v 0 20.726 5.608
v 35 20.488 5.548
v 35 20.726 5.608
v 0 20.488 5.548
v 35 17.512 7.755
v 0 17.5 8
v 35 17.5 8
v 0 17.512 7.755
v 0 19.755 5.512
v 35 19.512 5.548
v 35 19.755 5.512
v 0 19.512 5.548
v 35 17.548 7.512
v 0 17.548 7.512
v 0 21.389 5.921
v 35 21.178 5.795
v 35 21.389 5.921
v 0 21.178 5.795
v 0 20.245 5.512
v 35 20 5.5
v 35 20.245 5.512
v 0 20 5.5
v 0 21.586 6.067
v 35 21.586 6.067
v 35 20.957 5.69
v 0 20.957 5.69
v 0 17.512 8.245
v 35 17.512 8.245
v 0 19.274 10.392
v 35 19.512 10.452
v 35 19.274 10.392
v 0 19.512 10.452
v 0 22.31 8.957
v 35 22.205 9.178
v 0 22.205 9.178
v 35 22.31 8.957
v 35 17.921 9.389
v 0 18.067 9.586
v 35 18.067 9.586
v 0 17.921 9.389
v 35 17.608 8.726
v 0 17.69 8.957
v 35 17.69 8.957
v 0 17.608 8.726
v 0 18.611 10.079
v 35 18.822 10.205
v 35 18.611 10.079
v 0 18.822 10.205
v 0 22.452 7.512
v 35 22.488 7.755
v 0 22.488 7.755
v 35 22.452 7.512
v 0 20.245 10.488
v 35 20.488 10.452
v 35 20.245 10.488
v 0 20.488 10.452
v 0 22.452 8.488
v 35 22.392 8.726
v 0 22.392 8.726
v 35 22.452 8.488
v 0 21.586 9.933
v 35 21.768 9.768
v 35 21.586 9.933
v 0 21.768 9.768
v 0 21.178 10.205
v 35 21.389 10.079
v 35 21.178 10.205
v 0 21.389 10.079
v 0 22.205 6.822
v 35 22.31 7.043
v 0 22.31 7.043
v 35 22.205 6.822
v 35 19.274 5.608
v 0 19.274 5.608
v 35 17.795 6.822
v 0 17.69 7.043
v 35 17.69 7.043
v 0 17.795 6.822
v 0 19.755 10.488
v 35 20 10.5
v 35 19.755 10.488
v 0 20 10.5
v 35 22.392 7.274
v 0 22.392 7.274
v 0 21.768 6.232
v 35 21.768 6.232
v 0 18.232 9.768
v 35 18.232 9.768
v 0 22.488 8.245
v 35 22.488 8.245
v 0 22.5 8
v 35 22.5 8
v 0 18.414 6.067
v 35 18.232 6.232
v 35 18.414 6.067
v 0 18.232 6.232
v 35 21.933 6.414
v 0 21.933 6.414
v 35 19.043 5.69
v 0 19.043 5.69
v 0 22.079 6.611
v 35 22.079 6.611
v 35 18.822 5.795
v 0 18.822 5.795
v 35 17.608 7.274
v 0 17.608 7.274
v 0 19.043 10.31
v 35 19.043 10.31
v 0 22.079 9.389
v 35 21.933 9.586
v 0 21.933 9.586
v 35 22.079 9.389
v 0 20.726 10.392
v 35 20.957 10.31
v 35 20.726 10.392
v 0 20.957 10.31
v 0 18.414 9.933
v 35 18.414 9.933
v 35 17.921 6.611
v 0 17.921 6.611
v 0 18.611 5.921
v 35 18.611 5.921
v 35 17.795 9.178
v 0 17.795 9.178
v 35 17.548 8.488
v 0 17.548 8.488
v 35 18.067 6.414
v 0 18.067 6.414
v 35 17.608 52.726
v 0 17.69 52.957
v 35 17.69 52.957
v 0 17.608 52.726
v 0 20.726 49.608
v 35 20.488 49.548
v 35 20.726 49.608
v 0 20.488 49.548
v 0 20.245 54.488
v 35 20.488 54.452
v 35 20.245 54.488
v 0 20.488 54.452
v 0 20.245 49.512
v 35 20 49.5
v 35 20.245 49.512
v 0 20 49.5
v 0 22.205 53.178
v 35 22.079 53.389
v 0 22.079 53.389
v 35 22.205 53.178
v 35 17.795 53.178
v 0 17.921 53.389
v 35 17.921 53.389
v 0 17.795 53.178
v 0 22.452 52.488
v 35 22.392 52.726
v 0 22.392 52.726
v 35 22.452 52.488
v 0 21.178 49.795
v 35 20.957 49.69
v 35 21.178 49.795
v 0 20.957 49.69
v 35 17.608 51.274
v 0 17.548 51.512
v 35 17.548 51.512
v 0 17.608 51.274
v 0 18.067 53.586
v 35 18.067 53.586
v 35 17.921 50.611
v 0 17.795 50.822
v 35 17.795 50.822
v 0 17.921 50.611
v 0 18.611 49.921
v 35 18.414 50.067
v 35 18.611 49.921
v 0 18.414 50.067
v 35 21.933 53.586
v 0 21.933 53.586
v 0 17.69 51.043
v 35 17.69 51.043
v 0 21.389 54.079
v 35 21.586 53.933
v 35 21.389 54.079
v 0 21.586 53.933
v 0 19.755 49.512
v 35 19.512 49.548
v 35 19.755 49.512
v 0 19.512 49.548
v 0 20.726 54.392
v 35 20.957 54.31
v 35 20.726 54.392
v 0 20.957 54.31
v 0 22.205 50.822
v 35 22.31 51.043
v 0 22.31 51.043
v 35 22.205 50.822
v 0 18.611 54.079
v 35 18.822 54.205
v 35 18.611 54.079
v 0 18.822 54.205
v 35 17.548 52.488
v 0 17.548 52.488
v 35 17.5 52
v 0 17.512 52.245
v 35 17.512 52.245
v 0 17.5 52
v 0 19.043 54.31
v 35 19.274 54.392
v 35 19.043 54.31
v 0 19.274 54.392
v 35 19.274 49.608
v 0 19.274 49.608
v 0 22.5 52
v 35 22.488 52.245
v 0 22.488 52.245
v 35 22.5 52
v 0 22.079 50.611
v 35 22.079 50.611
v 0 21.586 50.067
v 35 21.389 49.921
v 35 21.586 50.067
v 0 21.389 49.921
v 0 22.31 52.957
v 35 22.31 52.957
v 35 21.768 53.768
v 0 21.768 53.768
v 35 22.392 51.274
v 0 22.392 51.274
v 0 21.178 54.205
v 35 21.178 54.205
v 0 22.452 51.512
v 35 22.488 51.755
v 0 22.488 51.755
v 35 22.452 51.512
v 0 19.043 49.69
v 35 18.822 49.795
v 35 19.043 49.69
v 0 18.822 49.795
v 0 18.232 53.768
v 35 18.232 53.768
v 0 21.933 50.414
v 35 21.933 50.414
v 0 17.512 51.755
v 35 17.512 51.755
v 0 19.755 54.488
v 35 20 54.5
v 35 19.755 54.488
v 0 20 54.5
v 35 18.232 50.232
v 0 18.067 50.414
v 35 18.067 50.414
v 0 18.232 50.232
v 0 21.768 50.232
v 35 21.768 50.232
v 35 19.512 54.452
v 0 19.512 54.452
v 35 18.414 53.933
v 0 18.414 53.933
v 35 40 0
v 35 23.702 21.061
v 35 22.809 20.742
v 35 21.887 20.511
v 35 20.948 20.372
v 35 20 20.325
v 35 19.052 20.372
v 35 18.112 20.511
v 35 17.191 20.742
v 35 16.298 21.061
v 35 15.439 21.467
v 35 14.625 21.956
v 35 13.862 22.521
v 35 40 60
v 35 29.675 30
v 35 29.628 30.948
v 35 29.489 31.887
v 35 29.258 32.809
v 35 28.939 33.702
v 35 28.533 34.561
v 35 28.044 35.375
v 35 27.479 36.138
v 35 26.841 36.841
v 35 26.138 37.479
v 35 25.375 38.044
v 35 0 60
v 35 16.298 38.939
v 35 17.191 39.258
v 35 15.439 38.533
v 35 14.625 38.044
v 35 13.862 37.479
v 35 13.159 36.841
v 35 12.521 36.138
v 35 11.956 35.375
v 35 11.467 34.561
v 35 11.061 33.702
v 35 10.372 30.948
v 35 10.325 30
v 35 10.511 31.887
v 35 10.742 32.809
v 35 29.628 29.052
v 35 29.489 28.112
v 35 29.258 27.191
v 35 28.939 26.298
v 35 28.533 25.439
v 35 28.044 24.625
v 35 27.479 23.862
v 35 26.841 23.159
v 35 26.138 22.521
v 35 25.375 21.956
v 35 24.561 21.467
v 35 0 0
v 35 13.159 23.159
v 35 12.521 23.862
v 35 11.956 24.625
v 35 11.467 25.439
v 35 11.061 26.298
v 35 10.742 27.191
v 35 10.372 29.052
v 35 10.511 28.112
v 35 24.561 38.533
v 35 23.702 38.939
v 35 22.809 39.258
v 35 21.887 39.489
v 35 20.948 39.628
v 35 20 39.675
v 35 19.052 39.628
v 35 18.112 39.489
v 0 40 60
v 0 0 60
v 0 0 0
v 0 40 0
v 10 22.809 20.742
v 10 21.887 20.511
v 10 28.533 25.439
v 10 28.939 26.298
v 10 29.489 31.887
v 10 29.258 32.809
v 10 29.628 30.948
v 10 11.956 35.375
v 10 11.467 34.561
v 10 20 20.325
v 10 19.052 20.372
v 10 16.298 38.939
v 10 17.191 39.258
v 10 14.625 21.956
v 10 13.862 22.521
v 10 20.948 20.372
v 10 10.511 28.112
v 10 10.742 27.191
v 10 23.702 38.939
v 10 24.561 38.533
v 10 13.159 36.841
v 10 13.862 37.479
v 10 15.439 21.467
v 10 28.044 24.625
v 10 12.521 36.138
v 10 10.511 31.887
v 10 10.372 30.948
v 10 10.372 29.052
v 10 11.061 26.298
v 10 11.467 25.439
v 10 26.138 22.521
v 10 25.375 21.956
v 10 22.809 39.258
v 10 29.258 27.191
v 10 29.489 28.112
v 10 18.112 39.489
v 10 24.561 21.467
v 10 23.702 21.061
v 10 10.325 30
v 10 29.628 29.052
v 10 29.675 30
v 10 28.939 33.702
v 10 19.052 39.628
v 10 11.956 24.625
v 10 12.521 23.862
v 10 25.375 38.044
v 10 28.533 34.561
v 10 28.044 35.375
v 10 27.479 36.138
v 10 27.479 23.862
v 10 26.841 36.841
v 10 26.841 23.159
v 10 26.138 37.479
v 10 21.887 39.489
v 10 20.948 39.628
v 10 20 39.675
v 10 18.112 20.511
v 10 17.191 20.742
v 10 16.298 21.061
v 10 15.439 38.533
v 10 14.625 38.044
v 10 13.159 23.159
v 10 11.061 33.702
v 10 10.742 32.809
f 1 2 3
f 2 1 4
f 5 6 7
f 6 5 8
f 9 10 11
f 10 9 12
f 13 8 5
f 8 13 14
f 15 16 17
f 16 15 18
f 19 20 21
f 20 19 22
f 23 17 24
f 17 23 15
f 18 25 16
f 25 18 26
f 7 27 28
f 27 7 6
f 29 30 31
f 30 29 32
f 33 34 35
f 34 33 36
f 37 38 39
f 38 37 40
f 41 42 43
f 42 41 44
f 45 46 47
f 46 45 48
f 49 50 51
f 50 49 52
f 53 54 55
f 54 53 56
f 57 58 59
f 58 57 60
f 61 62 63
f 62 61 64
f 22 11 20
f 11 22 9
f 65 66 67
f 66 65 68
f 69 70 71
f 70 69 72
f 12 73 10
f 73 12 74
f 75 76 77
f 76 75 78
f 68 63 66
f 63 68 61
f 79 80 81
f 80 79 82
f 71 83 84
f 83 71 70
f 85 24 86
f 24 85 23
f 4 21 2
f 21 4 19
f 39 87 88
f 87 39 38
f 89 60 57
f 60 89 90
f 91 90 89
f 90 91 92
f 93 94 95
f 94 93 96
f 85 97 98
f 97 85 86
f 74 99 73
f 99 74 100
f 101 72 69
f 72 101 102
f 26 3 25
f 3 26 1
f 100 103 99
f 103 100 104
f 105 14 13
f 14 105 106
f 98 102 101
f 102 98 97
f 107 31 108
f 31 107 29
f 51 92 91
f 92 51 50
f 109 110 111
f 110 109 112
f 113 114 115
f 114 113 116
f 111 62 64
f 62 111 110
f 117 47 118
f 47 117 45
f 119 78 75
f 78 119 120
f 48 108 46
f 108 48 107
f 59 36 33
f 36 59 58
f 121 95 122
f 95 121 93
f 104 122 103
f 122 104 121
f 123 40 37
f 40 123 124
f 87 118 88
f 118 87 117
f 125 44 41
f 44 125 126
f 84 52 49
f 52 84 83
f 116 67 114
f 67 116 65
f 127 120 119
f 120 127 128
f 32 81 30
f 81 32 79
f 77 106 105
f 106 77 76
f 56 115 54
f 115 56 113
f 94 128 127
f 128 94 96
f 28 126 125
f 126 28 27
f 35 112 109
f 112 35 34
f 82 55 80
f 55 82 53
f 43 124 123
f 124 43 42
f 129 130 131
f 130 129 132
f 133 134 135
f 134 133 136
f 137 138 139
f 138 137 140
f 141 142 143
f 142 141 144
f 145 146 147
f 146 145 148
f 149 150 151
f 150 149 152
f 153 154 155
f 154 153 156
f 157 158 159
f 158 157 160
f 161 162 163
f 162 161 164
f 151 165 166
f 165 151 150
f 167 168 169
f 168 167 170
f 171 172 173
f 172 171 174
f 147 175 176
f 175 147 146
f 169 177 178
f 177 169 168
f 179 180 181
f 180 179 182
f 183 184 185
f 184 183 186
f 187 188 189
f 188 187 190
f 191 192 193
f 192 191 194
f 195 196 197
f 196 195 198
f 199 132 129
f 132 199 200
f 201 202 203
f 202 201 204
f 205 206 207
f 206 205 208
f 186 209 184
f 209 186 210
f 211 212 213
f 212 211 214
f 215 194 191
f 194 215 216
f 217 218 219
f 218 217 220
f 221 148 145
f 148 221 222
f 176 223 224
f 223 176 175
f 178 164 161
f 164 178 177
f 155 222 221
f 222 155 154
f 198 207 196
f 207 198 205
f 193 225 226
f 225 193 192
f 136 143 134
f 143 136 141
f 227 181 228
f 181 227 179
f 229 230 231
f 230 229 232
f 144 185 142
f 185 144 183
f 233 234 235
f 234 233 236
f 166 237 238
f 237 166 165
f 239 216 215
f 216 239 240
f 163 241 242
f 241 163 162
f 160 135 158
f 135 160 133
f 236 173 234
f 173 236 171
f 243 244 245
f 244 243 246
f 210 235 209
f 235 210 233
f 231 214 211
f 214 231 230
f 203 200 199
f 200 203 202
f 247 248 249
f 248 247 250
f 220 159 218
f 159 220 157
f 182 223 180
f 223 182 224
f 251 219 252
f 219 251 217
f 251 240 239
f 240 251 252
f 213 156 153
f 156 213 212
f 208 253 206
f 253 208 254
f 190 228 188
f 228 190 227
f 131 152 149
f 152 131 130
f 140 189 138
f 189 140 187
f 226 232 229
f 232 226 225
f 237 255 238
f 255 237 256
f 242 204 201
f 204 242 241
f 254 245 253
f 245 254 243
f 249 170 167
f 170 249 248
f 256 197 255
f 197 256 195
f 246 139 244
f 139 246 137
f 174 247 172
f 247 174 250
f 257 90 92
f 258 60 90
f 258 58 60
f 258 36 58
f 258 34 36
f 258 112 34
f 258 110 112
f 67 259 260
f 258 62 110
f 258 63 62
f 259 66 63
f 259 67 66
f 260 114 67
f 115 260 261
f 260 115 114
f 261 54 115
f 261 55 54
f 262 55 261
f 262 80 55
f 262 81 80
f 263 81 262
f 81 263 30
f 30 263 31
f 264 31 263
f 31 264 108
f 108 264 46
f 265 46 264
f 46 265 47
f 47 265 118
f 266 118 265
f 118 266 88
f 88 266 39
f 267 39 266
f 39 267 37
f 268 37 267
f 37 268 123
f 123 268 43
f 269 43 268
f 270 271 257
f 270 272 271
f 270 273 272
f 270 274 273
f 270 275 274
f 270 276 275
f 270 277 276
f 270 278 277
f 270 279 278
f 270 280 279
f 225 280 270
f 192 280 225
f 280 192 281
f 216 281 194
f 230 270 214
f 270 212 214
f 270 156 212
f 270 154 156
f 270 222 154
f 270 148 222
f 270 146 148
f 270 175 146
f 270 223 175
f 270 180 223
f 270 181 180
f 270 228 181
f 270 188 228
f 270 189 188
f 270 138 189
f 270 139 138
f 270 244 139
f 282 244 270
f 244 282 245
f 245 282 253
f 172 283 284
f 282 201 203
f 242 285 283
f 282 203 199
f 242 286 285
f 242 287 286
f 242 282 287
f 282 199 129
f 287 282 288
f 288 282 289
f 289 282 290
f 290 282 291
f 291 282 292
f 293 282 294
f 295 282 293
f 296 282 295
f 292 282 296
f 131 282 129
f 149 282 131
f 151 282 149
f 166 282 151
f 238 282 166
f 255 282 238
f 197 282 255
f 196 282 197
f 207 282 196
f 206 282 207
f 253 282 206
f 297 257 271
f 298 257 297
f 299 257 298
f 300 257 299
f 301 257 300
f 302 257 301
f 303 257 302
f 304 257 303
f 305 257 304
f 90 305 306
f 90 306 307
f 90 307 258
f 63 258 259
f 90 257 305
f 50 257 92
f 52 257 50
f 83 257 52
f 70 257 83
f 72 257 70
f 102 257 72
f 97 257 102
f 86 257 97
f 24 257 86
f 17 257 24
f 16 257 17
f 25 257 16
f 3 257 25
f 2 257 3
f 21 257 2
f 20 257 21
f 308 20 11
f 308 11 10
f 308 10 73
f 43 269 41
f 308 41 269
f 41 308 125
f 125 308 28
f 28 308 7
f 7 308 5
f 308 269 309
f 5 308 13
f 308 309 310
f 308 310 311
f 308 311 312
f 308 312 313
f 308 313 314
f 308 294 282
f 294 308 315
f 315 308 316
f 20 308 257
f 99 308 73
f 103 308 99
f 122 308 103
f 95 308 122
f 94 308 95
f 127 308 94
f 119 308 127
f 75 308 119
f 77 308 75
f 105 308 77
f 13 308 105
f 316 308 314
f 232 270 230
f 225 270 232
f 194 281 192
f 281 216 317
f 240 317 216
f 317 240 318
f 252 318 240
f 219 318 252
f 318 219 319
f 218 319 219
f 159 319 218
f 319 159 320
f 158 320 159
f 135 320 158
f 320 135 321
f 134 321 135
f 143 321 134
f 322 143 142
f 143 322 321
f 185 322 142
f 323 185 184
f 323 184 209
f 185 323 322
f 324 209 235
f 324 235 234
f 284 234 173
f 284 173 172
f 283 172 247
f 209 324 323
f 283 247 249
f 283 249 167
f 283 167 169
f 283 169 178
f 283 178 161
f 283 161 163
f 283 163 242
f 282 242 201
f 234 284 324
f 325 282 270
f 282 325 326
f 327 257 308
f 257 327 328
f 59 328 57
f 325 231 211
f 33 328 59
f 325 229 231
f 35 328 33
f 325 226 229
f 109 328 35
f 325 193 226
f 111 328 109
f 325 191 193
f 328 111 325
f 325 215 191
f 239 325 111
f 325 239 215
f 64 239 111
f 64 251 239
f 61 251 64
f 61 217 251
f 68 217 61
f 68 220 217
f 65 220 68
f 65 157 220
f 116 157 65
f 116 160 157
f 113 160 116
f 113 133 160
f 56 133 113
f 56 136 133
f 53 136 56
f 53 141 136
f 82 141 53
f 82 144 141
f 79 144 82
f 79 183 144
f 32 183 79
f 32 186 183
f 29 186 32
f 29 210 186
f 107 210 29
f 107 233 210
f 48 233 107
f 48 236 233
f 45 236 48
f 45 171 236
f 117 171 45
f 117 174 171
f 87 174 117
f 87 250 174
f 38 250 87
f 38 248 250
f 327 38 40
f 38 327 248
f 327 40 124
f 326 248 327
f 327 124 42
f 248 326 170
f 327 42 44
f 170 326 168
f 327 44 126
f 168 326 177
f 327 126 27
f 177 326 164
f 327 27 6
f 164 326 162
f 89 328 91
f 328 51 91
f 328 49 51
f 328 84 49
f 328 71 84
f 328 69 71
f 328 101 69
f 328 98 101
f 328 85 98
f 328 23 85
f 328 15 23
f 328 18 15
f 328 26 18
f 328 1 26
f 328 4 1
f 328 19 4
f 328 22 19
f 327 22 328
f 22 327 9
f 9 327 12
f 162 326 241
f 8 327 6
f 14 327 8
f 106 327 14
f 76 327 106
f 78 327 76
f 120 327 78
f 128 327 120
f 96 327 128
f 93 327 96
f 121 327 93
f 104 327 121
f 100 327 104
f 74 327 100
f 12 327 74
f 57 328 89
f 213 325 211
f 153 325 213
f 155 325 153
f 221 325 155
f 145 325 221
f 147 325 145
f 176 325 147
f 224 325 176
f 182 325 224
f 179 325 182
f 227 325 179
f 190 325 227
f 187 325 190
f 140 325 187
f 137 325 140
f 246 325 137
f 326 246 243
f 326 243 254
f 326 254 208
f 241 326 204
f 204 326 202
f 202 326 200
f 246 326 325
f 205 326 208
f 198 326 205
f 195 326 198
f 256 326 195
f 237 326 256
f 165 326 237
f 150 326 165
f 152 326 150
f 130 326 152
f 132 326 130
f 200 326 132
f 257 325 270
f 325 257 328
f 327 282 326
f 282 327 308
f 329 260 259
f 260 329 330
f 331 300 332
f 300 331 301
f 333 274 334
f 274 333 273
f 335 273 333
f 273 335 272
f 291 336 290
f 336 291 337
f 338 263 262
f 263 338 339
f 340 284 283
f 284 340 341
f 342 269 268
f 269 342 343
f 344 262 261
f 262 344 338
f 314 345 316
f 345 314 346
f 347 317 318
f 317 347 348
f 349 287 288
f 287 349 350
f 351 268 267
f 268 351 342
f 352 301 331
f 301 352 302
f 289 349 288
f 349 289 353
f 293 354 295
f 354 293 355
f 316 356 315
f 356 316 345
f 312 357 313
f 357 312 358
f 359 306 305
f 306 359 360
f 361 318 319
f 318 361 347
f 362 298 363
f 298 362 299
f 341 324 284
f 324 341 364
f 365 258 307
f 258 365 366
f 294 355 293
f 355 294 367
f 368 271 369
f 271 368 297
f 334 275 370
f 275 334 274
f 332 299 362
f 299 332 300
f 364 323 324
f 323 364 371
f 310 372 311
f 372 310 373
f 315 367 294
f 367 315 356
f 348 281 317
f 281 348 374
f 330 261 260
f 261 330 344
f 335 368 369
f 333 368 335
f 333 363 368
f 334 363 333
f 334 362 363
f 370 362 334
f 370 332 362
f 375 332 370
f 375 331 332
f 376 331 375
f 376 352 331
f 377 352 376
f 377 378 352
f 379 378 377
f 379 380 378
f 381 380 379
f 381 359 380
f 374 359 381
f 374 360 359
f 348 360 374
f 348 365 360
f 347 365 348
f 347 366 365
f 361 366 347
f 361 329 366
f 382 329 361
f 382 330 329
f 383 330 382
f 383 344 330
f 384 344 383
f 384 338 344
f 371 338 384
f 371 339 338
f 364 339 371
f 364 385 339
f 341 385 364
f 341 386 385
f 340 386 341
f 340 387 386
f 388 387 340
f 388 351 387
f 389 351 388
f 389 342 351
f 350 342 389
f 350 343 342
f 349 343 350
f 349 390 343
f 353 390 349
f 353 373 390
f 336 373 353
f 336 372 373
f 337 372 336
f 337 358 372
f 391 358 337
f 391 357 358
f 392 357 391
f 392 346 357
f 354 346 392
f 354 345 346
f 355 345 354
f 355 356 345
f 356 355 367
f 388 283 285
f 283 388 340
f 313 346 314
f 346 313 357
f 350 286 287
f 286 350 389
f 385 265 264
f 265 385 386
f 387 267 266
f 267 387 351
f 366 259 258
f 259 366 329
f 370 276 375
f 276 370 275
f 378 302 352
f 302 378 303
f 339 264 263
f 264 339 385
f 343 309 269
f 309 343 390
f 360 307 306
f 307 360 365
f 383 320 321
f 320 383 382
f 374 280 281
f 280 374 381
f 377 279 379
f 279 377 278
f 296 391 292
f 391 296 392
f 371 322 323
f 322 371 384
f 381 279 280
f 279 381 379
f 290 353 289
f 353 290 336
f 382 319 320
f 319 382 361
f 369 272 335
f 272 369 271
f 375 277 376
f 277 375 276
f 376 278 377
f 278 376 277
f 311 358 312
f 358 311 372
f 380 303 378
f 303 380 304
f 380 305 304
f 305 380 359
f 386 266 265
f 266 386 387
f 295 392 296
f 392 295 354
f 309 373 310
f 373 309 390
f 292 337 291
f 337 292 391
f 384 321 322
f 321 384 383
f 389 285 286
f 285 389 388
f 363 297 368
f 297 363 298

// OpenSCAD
// file: lib/params.scad
// Shared parameters for the dowel desk shelf.
// Units are mm throughout.

// --- Dowel ---
dowel_diameter   = 19.05; // 3/4" dowel, measure your actual stock
dowel_tolerance  = 0.3;   // added to bore diameter for a snug press/slide fit
dowel_bore_depth = 25;    // how far the dowel is captured inside the wall piece

// --- Wall bracket block ---
// "width" runs along the wall (left-right), "height" is vertical,
// "depth" is how far the block sticks out from the wall (front-back).
wall_bracket_width  = 40;
wall_bracket_height = 60;
wall_bracket_depth  = dowel_bore_depth + 10; // bore depth + material behind it

// --- Wall mounting screws ---
// Through-holes near the back face for screwing into a stud/anchor.
mount_hole_diameter = 5;     // clearance for a #10 / M5 screw
mount_hole_inset    = 8;     // distance from block edges to hole centers
mount_hole_count    = 2;     // vertical holes, evenly spaced

// --- Print-friendliness ---
$fn = 64; // circle smoothness for previews/renders
// main file
// Wall-end bracket: 3D-printed piece that mounts to the wall and
// captures one end of a wooden dowel shelf support.
//
// Render a single bracket:
//   openscad -o export/wall.stl scad/wall.scad
//
// Preview both left/right mirrored brackets together by setting
// render_pair = true below (handy for eyeballing fit).

include <lib/params.scad>

render_pair = false;

module wall_bracket() {
    bore_d = dowel_diameter + dowel_tolerance;

    difference() {
        // Main block, flush against the wall on its back (X=0) face.
        cube([wall_bracket_depth, wall_bracket_width, wall_bracket_height]);

        // Dowel socket: blind hole bored in from the front face,
        // centered on the block, running along the depth (X) axis.
        translate([wall_bracket_depth - dowel_bore_depth,
                   wall_bracket_width / 2,
                   wall_bracket_height / 2])
            rotate([0, 90, 0])
                cylinder(h = dowel_bore_depth + 1, d = bore_d);

        // Wall mounting holes: through-holes along the depth axis,
        // near the back face, evenly spaced vertically.
        for (i = [0 : mount_hole_count - 1]) {
            frac = (mount_hole_count == 1) ? 0.5
                 : mount_hole_inset / wall_bracket_height
                   + i * (wall_bracket_height - 2 * mount_hole_inset)
                     / (wall_bracket_height * (mount_hole_count - 1));
            translate([-1, wall_bracket_width / 2, frac * wall_bracket_height])
                rotate([0, 90, 0])
                    cylinder(h = wall_bracket_depth + 2, d = mount_hole_diameter);
        }
    }
}

if (render_pair) {
    wall_bracket();
    translate([0, wall_bracket_width + 20, 0])
        mirror([0, 1, 0])
            wall_bracket();
} else {
    wall_bracket();
}
